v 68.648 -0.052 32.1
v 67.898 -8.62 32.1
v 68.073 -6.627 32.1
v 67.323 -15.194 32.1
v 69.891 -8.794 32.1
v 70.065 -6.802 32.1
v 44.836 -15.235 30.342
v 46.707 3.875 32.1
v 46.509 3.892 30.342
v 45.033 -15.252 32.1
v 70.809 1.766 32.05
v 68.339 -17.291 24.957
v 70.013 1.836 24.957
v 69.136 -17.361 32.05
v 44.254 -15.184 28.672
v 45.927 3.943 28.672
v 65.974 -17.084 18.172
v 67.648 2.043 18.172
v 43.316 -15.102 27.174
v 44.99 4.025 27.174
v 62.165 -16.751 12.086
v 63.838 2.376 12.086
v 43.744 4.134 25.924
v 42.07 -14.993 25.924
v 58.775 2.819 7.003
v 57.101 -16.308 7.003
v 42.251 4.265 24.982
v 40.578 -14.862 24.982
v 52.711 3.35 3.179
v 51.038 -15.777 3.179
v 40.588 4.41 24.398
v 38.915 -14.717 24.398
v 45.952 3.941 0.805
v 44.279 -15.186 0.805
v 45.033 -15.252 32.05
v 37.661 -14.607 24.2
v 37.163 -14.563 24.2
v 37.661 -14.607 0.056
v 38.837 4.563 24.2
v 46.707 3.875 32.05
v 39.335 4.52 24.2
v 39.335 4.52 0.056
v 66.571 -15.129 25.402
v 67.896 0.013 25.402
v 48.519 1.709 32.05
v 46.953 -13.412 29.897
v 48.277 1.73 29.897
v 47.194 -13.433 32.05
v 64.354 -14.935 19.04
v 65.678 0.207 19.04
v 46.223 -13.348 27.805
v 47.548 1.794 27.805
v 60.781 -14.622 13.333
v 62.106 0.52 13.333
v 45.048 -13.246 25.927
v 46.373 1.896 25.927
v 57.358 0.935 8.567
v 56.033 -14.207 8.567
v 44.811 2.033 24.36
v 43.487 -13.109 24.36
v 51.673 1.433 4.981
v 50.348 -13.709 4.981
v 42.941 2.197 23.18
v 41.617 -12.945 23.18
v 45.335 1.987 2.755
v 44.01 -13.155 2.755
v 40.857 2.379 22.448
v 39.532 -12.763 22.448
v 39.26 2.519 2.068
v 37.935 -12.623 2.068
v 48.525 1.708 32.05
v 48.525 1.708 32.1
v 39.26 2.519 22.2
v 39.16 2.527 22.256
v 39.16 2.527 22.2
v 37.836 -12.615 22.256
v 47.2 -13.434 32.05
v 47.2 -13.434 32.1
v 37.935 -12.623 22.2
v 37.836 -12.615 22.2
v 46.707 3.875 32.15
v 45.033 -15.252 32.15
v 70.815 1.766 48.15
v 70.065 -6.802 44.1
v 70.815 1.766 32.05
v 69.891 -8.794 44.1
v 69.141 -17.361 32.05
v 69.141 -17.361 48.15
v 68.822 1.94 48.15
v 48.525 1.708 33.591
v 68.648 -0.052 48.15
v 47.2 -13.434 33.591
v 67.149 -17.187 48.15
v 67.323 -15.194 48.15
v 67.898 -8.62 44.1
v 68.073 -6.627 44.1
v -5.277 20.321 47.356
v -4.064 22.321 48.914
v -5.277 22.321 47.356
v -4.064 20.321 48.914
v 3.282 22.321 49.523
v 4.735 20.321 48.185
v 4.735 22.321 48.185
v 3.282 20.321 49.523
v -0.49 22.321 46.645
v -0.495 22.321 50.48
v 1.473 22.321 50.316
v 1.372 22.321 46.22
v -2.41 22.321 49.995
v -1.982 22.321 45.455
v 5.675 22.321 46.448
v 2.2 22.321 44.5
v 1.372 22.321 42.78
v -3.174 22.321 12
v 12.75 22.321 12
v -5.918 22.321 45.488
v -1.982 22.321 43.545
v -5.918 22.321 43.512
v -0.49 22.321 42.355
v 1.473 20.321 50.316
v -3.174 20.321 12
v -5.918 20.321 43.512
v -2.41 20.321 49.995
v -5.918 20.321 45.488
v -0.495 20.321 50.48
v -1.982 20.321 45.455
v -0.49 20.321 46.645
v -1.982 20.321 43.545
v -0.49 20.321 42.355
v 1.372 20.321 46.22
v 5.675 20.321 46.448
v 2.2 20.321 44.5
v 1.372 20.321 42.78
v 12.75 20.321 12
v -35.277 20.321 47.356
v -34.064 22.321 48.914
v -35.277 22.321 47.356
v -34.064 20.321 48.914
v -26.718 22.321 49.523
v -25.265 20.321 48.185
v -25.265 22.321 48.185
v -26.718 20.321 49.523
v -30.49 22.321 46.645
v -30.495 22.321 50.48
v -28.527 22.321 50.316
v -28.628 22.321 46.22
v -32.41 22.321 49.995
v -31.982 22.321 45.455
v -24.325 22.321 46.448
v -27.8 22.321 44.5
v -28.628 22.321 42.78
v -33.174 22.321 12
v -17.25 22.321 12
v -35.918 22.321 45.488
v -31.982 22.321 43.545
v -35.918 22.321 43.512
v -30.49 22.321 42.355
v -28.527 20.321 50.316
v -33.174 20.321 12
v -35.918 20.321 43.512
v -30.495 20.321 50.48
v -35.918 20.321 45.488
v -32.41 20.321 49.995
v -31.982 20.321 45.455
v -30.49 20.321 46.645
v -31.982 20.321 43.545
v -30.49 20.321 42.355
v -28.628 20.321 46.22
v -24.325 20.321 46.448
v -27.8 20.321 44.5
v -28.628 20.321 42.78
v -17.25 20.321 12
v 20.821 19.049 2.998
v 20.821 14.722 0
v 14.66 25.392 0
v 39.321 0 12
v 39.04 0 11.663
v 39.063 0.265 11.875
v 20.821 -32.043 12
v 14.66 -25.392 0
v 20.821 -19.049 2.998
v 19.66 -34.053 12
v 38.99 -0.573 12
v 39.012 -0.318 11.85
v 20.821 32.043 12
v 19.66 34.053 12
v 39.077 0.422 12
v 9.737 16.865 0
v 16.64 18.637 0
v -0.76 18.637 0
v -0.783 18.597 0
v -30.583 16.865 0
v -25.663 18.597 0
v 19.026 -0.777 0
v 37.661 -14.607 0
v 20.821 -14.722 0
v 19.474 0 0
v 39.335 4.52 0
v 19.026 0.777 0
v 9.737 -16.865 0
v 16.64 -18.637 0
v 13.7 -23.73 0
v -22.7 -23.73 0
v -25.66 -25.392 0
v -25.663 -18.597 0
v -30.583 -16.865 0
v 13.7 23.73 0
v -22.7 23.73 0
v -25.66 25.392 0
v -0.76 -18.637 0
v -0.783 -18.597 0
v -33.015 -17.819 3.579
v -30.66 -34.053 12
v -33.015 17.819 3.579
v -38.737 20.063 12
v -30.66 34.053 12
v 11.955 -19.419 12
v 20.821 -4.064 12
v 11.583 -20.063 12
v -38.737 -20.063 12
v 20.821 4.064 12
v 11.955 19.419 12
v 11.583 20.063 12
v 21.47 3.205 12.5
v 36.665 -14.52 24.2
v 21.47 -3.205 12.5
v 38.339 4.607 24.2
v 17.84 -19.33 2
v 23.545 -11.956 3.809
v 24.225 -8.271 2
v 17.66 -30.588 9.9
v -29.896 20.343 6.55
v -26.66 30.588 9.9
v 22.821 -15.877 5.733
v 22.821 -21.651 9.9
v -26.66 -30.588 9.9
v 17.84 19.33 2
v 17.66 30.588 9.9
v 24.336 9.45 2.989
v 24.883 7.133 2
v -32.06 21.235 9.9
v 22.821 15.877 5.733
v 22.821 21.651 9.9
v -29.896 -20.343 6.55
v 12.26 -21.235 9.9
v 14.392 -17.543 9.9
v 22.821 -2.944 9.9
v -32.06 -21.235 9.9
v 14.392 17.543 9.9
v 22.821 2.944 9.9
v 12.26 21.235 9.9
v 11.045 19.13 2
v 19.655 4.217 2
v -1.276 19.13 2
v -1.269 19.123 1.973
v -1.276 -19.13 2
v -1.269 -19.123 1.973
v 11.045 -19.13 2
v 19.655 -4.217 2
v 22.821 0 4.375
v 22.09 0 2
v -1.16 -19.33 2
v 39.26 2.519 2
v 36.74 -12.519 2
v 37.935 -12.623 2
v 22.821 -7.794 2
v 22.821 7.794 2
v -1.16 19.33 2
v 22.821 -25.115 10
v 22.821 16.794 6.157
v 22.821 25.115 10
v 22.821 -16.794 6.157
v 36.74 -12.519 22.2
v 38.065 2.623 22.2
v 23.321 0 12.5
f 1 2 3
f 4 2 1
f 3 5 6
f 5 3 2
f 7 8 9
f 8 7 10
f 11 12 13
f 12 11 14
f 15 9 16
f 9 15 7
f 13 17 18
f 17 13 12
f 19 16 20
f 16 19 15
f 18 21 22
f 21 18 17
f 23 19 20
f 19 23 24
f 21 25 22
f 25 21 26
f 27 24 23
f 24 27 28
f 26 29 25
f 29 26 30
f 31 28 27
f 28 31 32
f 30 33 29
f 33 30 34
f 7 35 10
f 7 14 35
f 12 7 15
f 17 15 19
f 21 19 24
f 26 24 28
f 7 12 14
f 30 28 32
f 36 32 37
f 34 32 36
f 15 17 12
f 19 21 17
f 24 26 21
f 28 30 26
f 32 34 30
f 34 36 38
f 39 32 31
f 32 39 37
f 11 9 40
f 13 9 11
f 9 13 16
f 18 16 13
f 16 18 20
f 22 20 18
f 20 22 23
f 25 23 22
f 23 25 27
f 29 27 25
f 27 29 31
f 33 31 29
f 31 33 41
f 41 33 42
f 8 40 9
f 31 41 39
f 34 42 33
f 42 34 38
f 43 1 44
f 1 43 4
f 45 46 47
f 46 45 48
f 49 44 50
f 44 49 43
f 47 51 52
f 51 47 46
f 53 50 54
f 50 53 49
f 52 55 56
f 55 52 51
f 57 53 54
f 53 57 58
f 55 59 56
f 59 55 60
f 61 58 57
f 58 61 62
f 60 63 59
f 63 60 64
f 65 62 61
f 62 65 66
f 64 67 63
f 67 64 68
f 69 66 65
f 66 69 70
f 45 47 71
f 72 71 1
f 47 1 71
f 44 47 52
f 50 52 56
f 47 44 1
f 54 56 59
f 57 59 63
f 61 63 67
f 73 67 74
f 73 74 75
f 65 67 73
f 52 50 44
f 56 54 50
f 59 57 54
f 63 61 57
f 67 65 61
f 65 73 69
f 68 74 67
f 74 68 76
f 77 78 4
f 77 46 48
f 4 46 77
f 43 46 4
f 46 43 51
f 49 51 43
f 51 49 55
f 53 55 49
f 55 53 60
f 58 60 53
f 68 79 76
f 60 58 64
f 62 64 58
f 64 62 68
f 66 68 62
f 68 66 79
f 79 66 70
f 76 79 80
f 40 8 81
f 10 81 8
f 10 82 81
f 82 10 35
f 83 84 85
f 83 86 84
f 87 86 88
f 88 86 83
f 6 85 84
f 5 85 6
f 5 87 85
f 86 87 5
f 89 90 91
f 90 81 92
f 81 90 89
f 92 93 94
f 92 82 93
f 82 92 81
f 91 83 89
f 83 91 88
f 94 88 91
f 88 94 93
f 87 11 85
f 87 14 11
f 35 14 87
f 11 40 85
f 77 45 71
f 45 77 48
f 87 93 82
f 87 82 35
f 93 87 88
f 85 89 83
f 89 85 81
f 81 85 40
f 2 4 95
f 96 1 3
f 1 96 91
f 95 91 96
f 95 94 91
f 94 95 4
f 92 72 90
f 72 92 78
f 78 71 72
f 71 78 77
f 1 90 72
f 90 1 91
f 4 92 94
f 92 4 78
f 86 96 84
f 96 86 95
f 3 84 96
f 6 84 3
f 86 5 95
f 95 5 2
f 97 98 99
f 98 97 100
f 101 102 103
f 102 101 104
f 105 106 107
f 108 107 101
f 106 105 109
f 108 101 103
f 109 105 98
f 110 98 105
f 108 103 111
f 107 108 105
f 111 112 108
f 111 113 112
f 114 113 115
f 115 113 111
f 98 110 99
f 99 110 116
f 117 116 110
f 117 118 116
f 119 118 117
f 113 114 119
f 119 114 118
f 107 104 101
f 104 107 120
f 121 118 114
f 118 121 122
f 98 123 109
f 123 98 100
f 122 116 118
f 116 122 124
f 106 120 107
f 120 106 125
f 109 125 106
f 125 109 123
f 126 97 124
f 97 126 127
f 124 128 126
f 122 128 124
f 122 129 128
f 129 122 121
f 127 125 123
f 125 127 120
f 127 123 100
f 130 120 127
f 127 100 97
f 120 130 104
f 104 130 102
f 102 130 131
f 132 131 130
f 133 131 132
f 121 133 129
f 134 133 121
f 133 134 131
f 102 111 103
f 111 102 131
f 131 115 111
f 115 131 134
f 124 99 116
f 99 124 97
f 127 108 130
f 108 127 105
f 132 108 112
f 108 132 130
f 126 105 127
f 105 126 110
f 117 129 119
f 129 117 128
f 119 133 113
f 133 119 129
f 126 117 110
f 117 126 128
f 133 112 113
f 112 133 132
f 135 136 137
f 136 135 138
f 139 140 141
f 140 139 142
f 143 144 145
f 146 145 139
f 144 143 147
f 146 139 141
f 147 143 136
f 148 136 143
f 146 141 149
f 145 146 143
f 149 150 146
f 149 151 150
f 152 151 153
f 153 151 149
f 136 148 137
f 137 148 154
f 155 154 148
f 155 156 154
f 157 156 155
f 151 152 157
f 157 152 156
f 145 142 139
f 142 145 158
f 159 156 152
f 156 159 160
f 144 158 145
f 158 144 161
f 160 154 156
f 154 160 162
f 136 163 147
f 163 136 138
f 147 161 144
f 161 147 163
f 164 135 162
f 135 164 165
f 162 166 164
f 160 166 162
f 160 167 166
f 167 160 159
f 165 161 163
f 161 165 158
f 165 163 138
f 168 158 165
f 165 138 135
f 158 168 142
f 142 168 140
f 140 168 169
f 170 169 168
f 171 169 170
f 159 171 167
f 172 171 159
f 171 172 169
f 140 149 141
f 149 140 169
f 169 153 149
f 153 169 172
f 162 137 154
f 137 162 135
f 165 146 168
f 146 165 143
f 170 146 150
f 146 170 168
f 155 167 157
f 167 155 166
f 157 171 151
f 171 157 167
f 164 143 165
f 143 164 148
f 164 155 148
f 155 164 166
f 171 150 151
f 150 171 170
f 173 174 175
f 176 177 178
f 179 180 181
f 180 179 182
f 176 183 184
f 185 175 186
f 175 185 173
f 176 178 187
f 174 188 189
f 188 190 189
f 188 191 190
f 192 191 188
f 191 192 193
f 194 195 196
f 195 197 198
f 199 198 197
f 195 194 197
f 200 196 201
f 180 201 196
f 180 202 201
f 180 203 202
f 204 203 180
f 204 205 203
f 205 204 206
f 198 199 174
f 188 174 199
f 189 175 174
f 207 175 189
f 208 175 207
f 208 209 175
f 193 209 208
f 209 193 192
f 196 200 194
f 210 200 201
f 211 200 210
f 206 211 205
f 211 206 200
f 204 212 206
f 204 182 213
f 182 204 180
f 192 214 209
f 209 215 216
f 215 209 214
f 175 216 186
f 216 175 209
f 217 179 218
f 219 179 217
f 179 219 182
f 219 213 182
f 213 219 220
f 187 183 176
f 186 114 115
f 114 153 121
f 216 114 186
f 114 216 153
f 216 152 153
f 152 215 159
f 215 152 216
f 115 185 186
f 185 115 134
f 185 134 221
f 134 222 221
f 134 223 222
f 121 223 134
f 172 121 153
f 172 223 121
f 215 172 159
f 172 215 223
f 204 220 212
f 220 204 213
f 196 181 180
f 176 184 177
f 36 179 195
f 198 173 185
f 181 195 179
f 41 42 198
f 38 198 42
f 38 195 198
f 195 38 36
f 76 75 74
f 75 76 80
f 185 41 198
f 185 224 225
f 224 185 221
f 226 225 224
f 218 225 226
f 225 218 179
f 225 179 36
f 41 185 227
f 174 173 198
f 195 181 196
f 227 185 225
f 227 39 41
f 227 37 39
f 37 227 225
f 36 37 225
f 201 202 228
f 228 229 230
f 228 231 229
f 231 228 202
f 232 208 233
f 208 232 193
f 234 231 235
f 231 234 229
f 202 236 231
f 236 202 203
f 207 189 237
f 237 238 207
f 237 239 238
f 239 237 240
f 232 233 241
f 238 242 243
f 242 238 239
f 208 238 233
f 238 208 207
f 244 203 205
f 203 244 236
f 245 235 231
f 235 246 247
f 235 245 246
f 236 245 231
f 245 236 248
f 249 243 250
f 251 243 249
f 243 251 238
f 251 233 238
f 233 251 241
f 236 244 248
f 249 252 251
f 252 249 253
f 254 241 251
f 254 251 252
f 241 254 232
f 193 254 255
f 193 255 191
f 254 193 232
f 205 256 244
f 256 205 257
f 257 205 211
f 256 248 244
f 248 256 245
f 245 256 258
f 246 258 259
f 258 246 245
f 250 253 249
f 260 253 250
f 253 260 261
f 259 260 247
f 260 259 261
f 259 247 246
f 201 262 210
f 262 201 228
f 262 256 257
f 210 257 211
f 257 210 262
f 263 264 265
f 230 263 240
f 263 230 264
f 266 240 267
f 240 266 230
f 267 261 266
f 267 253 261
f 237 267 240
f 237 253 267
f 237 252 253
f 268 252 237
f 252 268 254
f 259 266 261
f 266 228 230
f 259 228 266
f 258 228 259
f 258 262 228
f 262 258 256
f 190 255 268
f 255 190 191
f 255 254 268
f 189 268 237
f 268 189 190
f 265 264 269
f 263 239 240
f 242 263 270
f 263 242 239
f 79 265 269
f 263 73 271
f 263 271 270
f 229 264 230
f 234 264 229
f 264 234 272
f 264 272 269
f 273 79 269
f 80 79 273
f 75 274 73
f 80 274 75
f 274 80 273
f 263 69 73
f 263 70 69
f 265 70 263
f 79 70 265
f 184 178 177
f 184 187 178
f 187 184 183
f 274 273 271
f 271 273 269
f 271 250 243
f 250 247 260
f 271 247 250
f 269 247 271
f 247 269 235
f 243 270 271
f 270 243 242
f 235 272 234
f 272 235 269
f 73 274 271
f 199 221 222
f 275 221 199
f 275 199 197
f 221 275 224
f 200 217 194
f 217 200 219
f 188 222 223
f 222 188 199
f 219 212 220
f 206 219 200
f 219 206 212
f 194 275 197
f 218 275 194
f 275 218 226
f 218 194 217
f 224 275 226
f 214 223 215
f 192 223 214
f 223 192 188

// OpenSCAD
hot_rad = 30/2/cos(30);
hotend_x=25;
fan_x = 15+5;

hotend_y=-5;

thickness = 10;
wall=2;
slop=.2;

fan_hole = (40-wall-wall)/2;
mount_drop = 10;
fan_z = fan_hole+wall;

//fan_mount();
//bowden_fan();
cyclops_fan();

%cylinder(r=hot_rad, h=20, center=true);
%translate([-23,0,0]) cylinder(r=hot_rad, h=20, center=true);

m3_cap_rad = 4;
m3_rad = 2;
m3_nut_rad = 6.01/2+.1;

facets = 6;

duct_angle=-5;
duct_jut = -5;

module fan_mount(){
    difference(){
        union(){
            //core
            cylinder(r1=hot_rad+thickness+wall, r2=hot_rad+thickness*2+wall, h=thickness+wall, $fn=facets);
            
            hull(){
                intersection(){
                    difference(){
                        cylinder(r1=hot_rad+thickness+wall, r2=hot_rad+thickness*2+wall, h=thickness+wall, $fn=facets);
                        translate([0,0,-.5]) cylinder(r1=hot_rad+wall, r2=hot_rad+wall+wall, h=thickness+wall+1, $fn=facets);
                    }
                    translate([50+hot_rad-6.7,50,50]) cube([100,100,100], center=true);
                }
                translate([hotend_x+fan_x-5,hotend_y,fan_z]) rotate([0,90,0]) cylinder(r=fan_hole+wall, h=5);
            }
            
            hull(){
                intersection(){
                    difference(){
                        cylinder(r1=hot_rad+thickness+wall, r2=hot_rad+thickness*2+wall, h=thickness+wall, $fn=facets);
                        translate([0,0,-.5]) cylinder(r1=hot_rad+wall, r2=hot_rad+wall+wall, h=thickness+wall+1, $fn=facets);
                    }
                    translate([50+hot_rad-6.7,-50,50]) cube([100,100,100], center=true);
                }
                translate([hotend_x+fan_x-5,hotend_y,fan_z]) rotate([0,90,0]) cylinder(r=fan_hole+wall, h=5);
            }
            
            //fan mount
            translate([hotend_x+fan_x,hotend_y,fan_z]) rotate([0,90,0]){
                hull() for(i=[0:90:359]) rotate([0,0,i]) {
                    #translate([20-wall,20-wall,-wall]) cylinder(r=wall,h=wall*2, $fn=16);
                }    
            }
            
            //mounting lugs above fan
            translate([hotend_x+fan_x,hotend_y,fan_z]) rotate([0,90,0]){
                for(i=[-16, 16]) difference(){
                    hull(){
                        translate([-16-mount_drop,i,-fan_x+3]) cylinder(r=m3_rad+wall, h=wall*2, $fn=16);
                        translate([0,i,-fan_x+3]) cylinder(r=m3_cap_rad*2, h=wall);
                    }
                    translate([-16-mount_drop,i,-fan_x+3-.1]) cylinder(r=m3_rad, h=wall*2+1, $fn=16);
                }
            }
        }
        
        //center cutout
        translate([0,0,-.5]) cylinder(r1=hot_rad+wall, r2=hot_rad+wall+wall, h=thickness+wall+1, $fn=facets);
                
        //front cutout
        translate([-(hot_rad+thickness*2+wall),0,0]) cylinder(r=hot_rad+thickness*2+wall, h=thickness+wall*10, center=true, $fn=facets);
        
        //fan holes
        translate([hotend_x+fan_x,hotend_y,fan_z]) rotate([0,90,0]){
            for(i=[-16, 16]) for(j=[-16, 16]) {
                #translate([j,i,-.1]) cylinder(r=m3_rad, h=wall+.2, $fn=16);
                translate([j,i,-wall*2-.1]) cylinder(r2=m3_nut_rad, r1=m3_nut_rad+.25, h=wall*2+.2, $fn=6);
            }
        }
        
        //air path
        translate([0,0,-.1]) difference(){
            union(){
                translate([-wall,0,0]) cylinder(r1=hot_rad+thickness, r2=hot_rad+thickness*2-wall, h=thickness, $fn=facets);
                
                hull(){
                    intersection(){
                        difference(){
                            translate([-wall,0,0]) cylinder(r1=hot_rad+thickness, r2=hot_rad+thickness*2-wall, h=thickness, $fn=facets);
                            translate([0,0,-.5]) cylinder(r1=hot_rad+wall*2, r2=hot_rad+wall*3, h=thickness+wall+1, $fn=facets);
                        }
                        translate([50+hot_rad-6.7,50,50]) cube([100,100,100], center=true);
                    }
                    translate([hotend_x+fan_x-5,hotend_y,fan_z]) rotate([0,90,0]) cylinder(r=fan_hole, h=.3);
                }
                
                hull(){
                    intersection(){
                        difference(){
                            translate([-wall,0,0]) cylinder(r1=hot_rad+thickness, r2=hot_rad+thickness*2-wall, h=thickness, $fn=facets);
                            translate([0,0,-.5]) cylinder(r1=hot_rad+wall+wall, r2=hot_rad+wall+wall+wall, h=thickness+wall+1, $fn=facets);
                        }
                        translate([50+hot_rad-6.7,-50,50]) cube([100,100,100], center=true);
                    }
                    translate([hotend_x+fan_x-5,hotend_y,fan_z]) rotate([0,90,0]) cylinder(r=fan_hole, h=.3);
                }
                
                translate([hotend_x+fan_x-5,hotend_y,fan_z]) rotate([0,90,0]) cylinder(r=fan_hole, h=wall+1+5);
            }
            cylinder(r1=hot_rad+wall+wall, r2=hot_rad+wall+wall+wall, h=thickness+wall, $fn=facets);
            translate([-(hot_rad+thickness*2),0,0]) cylinder(r=hot_rad+thickness*2+wall, h=thickness+wall*10, center=true, $fn=facets);
            translate([0,-5+hotend_y/2,0])cube([100,10,wall]);
        }
    }
}

module bowden_fan(){
    duct_w = 15+slop;
    duct_h = 20+slop;
    duct_offset=38;
    
    mount_height = 46;
    
    offset = -20;
    difference(){
        union(){
            //core
            hull(){
                cylinder(r1=hot_rad+thickness+wall, r2=hot_rad+thickness*2+wall, h=thickness+wall, $fn=facets);
                translate([offset,0,0]) cylinder(r1=hot_rad+thickness+wall, r2=hot_rad+thickness*2+wall, h=thickness+wall, $fn=facets);
            }
            
            //connection to duct
            hull(){
                intersection(){
                    cylinder(r1=hot_rad+thickness+wall, r2=hot_rad+thickness*2+wall, h=thickness+wall, $fn=facets);
                    translate([hot_rad+wall*2,0,0]) cube([1,200,200], center=true);
                }
                translate([duct_offset,duct_jut,duct_h/2+wall]) rotate([0,0,duct_angle]) cube([1,duct_w+wall*2, duct_h+wall*2], center=true);
            }
            
            //the duct connector
            translate([duct_offset,duct_jut,0]) rotate([0,0,duct_angle]) duct();
            
            //mounting lugs
           for(i=[10,-20,-40]) difference(){
                translate([i,hot_rad+wall*2,0]) hull(){
                    translate([5,0,thickness]) rotate([90,0,0]) cylinder(r=m3_cap_rad+wall*2, h=wall, center=true);
                    translate([0,0,mount_height]) rotate([90,0,0]) cylinder(r=m3_cap_rad+wall, h=wall, center=true);
                }
                
                //mounting holes up top
                translate([i,hot_rad+wall*2,mount_height]) rotate([90,0,0]) cylinder(r=m3_rad+slop, h=20, center=true);
            }
        }
        
        //connection to duct airflow
        hull(){
            intersection(){
                translate([0,0,wall]) cylinder(r1=hot_rad+thickness, r2=hot_rad+thickness*2, h=thickness-wall, $fn=facets);
                translate([hot_rad+wall*3,0,0]) cube([1,200,200], center=true);
            }
            translate([duct_offset,duct_jut,duct_h/2+wall]) rotate([0,0,duct_angle]) cube([1.2,duct_w, duct_h], center=true);
        }
        
        //center cutout
        translate([0,0,-.5]) hull(){
            cylinder(r1=hot_rad+wall, r2=hot_rad+wall*3, h=thickness+wall+1, $fn=facets);
            translate([2*offset,0,0]) cylinder(r1=hot_rad+wall, r2=hot_rad+wall*3, h=thickness+wall+1, $fn=facets);
        }
        
        //air path
        difference(){
            //core
            translate([0,0,-.1]) hull(){
                cylinder(r1=hot_rad+thickness, r2=hot_rad+thickness*2-wall, h=thickness, $fn=facets);
                translate([offset+wall,0,0]) cylinder(r1=hot_rad+thickness, r2=hot_rad+thickness*2-wall, h=thickness, $fn=facets);
            }
            
            //keep the center walls in place
            translate([0,0,-.5]) hull(){
                cylinder(r1=hot_rad+wall*2, r2=hot_rad+wall*4, h=thickness+wall+1, $fn=facets);
                translate([2*offset,0,0]) cylinder(r1=hot_rad+wall*2, r2=hot_rad+wall*4, h=thickness+wall+1, $fn=facets);
            }
            
            //bottom on the near side
            translate([10,0,-.5]) cylinder(r1=hot_rad+wall*2, r2=hot_rad+wall*2.5, h=wall+.5, $fn=facets);
        }
    }
}

module cyclops_fan(){
    duct_w = 15+slop;
    duct_h = 20+slop;
    duct_offset=38;
    
    mount_height = 46-1.5;
    mount_offset = 10;
    
    offset = -11;
    difference(){
        union(){
            //core
            hull(){
                cylinder(r1=hot_rad+thickness+wall, r2=hot_rad+thickness*2+wall, h=thickness+wall, $fn=facets);
                translate([offset,0,0]) cylinder(r1=hot_rad+thickness+wall, r2=hot_rad+thickness*2+wall, h=thickness+wall, $fn=facets);
            }
            
            //connection to duct
            hull(){
                intersection(){
                    cylinder(r1=hot_rad+thickness+wall, r2=hot_rad+thickness*2+wall, h=thickness+wall, $fn=facets);
                    translate([hot_rad+wall*2,0,0]) cube([1,200,200], center=true);
                }
                translate([duct_offset,duct_jut,duct_h/2+wall]) rotate([0,0,duct_angle]) cube([1,duct_w+wall*2, duct_h+wall*2], center=true);
            }
            
            //the duct connector
            translate([duct_offset,duct_jut,0]) rotate([0,0,duct_angle]) duct();
            
            //mounting lugs
           for(i=[10-mount_offset,-20-mount_offset]) difference(){
                translate([i,hot_rad+wall*2,0]) hull(){
                    translate([5,0,thickness]) rotate([90,0,0]) cylinder(r=m3_cap_rad+wall*2, h=wall, center=true);
                    translate([0,0,mount_height]) rotate([90,0,0]) cylinder(r=m3_cap_rad+wall, h=wall, center=true);
                }
                
                //mounting holes up top
                translate([i,hot_rad+wall*2,mount_height]) rotate([90,0,0]) cylinder(r=m3_rad+slop, h=20, center=true);
            }
        }
        
        //connection to duct airflow
        hull(){
            intersection(){
                translate([0,0,wall]) cylinder(r1=hot_rad+thickness, r2=hot_rad+thickness*2, h=thickness-wall, $fn=facets);
                translate([hot_rad+wall*3,0,0]) cube([1,200,200], center=true);
            }
            translate([duct_offset,duct_jut,duct_h/2+wall]) rotate([0,0,duct_angle]) cube([1.2,duct_w, duct_h], center=true);
        }
        
        //center cutout
        translate([0,0,-.5]) hull(){
            cylinder(r1=hot_rad+wall, r2=hot_rad+wall*3, h=thickness+wall+1, $fn=facets);
            translate([5*offset,0,0]) cylinder(r1=hot_rad+wall, r2=hot_rad+wall*3, h=thickness+wall+1, $fn=facets);
        }
        
        //air path
        difference(){
            //core
            translate([0,0,-.1]) hull(){
                cylinder(r1=hot_rad+thickness, r2=hot_rad+thickness*2-wall, h=thickness, $fn=facets);
                translate([offset+wall,0,0]) cylinder(r1=hot_rad+thickness, r2=hot_rad+thickness*2-wall, h=thickness, $fn=facets);
            }
            
            //keep the center walls in place
            translate([0,0,-.5]) hull(){
                cylinder(r1=hot_rad+wall*2, r2=hot_rad+wall*4, h=thickness+wall+1, $fn=facets);
                translate([5*offset,0,0]) cylinder(r1=hot_rad+wall*2, r2=hot_rad+wall*4, h=thickness+wall+1, $fn=facets);
            }
            
            //bottom on the near side
            translate([10,0,-.5]) cylinder(r1=hot_rad+wall*2, r2=hot_rad+wall*2.5, h=wall+.5, $fn=facets);
        }
    }
}

module duct(){
    duct_w = 15+slop;
    duct_h = 20+slop;
    rad = 20;
    
    translate([0,0,rad+wall+duct_h/2]) rotate([-90,0,0]) union(){
        intersection(){
            rotate_extrude(angle = 90, convexity = 2){
                translate([rad,0,0])
                difference(){
                    square([duct_h+wall*2, duct_w+wall*2], center=true);
                    square([duct_h, duct_w], center=true);
                }
            }
            translate([0,0,-100]) cube([200,200,200]);
        }
        
        translate([rad,0,0]) rotate([90,0,0]) translate([0,0,8]) difference(){
            hull(){
                translate([0,0,-8]) cube([duct_h+wall*2,duct_w+wall*2,.1], center=true);
                #translate([duct_h/2+wall/2,0,8]) cube([wall,duct_w+wall*2,.1], center=true);
            }
            
            //hollow center
            cube([duct_h,duct_w,16.3], center=true);
            
            //slot for the clip
            translate([wall+1,0,(12-16)/2]) cube([duct_h+wall*2,2,12], center=true);
        }
        
    }
    
}
